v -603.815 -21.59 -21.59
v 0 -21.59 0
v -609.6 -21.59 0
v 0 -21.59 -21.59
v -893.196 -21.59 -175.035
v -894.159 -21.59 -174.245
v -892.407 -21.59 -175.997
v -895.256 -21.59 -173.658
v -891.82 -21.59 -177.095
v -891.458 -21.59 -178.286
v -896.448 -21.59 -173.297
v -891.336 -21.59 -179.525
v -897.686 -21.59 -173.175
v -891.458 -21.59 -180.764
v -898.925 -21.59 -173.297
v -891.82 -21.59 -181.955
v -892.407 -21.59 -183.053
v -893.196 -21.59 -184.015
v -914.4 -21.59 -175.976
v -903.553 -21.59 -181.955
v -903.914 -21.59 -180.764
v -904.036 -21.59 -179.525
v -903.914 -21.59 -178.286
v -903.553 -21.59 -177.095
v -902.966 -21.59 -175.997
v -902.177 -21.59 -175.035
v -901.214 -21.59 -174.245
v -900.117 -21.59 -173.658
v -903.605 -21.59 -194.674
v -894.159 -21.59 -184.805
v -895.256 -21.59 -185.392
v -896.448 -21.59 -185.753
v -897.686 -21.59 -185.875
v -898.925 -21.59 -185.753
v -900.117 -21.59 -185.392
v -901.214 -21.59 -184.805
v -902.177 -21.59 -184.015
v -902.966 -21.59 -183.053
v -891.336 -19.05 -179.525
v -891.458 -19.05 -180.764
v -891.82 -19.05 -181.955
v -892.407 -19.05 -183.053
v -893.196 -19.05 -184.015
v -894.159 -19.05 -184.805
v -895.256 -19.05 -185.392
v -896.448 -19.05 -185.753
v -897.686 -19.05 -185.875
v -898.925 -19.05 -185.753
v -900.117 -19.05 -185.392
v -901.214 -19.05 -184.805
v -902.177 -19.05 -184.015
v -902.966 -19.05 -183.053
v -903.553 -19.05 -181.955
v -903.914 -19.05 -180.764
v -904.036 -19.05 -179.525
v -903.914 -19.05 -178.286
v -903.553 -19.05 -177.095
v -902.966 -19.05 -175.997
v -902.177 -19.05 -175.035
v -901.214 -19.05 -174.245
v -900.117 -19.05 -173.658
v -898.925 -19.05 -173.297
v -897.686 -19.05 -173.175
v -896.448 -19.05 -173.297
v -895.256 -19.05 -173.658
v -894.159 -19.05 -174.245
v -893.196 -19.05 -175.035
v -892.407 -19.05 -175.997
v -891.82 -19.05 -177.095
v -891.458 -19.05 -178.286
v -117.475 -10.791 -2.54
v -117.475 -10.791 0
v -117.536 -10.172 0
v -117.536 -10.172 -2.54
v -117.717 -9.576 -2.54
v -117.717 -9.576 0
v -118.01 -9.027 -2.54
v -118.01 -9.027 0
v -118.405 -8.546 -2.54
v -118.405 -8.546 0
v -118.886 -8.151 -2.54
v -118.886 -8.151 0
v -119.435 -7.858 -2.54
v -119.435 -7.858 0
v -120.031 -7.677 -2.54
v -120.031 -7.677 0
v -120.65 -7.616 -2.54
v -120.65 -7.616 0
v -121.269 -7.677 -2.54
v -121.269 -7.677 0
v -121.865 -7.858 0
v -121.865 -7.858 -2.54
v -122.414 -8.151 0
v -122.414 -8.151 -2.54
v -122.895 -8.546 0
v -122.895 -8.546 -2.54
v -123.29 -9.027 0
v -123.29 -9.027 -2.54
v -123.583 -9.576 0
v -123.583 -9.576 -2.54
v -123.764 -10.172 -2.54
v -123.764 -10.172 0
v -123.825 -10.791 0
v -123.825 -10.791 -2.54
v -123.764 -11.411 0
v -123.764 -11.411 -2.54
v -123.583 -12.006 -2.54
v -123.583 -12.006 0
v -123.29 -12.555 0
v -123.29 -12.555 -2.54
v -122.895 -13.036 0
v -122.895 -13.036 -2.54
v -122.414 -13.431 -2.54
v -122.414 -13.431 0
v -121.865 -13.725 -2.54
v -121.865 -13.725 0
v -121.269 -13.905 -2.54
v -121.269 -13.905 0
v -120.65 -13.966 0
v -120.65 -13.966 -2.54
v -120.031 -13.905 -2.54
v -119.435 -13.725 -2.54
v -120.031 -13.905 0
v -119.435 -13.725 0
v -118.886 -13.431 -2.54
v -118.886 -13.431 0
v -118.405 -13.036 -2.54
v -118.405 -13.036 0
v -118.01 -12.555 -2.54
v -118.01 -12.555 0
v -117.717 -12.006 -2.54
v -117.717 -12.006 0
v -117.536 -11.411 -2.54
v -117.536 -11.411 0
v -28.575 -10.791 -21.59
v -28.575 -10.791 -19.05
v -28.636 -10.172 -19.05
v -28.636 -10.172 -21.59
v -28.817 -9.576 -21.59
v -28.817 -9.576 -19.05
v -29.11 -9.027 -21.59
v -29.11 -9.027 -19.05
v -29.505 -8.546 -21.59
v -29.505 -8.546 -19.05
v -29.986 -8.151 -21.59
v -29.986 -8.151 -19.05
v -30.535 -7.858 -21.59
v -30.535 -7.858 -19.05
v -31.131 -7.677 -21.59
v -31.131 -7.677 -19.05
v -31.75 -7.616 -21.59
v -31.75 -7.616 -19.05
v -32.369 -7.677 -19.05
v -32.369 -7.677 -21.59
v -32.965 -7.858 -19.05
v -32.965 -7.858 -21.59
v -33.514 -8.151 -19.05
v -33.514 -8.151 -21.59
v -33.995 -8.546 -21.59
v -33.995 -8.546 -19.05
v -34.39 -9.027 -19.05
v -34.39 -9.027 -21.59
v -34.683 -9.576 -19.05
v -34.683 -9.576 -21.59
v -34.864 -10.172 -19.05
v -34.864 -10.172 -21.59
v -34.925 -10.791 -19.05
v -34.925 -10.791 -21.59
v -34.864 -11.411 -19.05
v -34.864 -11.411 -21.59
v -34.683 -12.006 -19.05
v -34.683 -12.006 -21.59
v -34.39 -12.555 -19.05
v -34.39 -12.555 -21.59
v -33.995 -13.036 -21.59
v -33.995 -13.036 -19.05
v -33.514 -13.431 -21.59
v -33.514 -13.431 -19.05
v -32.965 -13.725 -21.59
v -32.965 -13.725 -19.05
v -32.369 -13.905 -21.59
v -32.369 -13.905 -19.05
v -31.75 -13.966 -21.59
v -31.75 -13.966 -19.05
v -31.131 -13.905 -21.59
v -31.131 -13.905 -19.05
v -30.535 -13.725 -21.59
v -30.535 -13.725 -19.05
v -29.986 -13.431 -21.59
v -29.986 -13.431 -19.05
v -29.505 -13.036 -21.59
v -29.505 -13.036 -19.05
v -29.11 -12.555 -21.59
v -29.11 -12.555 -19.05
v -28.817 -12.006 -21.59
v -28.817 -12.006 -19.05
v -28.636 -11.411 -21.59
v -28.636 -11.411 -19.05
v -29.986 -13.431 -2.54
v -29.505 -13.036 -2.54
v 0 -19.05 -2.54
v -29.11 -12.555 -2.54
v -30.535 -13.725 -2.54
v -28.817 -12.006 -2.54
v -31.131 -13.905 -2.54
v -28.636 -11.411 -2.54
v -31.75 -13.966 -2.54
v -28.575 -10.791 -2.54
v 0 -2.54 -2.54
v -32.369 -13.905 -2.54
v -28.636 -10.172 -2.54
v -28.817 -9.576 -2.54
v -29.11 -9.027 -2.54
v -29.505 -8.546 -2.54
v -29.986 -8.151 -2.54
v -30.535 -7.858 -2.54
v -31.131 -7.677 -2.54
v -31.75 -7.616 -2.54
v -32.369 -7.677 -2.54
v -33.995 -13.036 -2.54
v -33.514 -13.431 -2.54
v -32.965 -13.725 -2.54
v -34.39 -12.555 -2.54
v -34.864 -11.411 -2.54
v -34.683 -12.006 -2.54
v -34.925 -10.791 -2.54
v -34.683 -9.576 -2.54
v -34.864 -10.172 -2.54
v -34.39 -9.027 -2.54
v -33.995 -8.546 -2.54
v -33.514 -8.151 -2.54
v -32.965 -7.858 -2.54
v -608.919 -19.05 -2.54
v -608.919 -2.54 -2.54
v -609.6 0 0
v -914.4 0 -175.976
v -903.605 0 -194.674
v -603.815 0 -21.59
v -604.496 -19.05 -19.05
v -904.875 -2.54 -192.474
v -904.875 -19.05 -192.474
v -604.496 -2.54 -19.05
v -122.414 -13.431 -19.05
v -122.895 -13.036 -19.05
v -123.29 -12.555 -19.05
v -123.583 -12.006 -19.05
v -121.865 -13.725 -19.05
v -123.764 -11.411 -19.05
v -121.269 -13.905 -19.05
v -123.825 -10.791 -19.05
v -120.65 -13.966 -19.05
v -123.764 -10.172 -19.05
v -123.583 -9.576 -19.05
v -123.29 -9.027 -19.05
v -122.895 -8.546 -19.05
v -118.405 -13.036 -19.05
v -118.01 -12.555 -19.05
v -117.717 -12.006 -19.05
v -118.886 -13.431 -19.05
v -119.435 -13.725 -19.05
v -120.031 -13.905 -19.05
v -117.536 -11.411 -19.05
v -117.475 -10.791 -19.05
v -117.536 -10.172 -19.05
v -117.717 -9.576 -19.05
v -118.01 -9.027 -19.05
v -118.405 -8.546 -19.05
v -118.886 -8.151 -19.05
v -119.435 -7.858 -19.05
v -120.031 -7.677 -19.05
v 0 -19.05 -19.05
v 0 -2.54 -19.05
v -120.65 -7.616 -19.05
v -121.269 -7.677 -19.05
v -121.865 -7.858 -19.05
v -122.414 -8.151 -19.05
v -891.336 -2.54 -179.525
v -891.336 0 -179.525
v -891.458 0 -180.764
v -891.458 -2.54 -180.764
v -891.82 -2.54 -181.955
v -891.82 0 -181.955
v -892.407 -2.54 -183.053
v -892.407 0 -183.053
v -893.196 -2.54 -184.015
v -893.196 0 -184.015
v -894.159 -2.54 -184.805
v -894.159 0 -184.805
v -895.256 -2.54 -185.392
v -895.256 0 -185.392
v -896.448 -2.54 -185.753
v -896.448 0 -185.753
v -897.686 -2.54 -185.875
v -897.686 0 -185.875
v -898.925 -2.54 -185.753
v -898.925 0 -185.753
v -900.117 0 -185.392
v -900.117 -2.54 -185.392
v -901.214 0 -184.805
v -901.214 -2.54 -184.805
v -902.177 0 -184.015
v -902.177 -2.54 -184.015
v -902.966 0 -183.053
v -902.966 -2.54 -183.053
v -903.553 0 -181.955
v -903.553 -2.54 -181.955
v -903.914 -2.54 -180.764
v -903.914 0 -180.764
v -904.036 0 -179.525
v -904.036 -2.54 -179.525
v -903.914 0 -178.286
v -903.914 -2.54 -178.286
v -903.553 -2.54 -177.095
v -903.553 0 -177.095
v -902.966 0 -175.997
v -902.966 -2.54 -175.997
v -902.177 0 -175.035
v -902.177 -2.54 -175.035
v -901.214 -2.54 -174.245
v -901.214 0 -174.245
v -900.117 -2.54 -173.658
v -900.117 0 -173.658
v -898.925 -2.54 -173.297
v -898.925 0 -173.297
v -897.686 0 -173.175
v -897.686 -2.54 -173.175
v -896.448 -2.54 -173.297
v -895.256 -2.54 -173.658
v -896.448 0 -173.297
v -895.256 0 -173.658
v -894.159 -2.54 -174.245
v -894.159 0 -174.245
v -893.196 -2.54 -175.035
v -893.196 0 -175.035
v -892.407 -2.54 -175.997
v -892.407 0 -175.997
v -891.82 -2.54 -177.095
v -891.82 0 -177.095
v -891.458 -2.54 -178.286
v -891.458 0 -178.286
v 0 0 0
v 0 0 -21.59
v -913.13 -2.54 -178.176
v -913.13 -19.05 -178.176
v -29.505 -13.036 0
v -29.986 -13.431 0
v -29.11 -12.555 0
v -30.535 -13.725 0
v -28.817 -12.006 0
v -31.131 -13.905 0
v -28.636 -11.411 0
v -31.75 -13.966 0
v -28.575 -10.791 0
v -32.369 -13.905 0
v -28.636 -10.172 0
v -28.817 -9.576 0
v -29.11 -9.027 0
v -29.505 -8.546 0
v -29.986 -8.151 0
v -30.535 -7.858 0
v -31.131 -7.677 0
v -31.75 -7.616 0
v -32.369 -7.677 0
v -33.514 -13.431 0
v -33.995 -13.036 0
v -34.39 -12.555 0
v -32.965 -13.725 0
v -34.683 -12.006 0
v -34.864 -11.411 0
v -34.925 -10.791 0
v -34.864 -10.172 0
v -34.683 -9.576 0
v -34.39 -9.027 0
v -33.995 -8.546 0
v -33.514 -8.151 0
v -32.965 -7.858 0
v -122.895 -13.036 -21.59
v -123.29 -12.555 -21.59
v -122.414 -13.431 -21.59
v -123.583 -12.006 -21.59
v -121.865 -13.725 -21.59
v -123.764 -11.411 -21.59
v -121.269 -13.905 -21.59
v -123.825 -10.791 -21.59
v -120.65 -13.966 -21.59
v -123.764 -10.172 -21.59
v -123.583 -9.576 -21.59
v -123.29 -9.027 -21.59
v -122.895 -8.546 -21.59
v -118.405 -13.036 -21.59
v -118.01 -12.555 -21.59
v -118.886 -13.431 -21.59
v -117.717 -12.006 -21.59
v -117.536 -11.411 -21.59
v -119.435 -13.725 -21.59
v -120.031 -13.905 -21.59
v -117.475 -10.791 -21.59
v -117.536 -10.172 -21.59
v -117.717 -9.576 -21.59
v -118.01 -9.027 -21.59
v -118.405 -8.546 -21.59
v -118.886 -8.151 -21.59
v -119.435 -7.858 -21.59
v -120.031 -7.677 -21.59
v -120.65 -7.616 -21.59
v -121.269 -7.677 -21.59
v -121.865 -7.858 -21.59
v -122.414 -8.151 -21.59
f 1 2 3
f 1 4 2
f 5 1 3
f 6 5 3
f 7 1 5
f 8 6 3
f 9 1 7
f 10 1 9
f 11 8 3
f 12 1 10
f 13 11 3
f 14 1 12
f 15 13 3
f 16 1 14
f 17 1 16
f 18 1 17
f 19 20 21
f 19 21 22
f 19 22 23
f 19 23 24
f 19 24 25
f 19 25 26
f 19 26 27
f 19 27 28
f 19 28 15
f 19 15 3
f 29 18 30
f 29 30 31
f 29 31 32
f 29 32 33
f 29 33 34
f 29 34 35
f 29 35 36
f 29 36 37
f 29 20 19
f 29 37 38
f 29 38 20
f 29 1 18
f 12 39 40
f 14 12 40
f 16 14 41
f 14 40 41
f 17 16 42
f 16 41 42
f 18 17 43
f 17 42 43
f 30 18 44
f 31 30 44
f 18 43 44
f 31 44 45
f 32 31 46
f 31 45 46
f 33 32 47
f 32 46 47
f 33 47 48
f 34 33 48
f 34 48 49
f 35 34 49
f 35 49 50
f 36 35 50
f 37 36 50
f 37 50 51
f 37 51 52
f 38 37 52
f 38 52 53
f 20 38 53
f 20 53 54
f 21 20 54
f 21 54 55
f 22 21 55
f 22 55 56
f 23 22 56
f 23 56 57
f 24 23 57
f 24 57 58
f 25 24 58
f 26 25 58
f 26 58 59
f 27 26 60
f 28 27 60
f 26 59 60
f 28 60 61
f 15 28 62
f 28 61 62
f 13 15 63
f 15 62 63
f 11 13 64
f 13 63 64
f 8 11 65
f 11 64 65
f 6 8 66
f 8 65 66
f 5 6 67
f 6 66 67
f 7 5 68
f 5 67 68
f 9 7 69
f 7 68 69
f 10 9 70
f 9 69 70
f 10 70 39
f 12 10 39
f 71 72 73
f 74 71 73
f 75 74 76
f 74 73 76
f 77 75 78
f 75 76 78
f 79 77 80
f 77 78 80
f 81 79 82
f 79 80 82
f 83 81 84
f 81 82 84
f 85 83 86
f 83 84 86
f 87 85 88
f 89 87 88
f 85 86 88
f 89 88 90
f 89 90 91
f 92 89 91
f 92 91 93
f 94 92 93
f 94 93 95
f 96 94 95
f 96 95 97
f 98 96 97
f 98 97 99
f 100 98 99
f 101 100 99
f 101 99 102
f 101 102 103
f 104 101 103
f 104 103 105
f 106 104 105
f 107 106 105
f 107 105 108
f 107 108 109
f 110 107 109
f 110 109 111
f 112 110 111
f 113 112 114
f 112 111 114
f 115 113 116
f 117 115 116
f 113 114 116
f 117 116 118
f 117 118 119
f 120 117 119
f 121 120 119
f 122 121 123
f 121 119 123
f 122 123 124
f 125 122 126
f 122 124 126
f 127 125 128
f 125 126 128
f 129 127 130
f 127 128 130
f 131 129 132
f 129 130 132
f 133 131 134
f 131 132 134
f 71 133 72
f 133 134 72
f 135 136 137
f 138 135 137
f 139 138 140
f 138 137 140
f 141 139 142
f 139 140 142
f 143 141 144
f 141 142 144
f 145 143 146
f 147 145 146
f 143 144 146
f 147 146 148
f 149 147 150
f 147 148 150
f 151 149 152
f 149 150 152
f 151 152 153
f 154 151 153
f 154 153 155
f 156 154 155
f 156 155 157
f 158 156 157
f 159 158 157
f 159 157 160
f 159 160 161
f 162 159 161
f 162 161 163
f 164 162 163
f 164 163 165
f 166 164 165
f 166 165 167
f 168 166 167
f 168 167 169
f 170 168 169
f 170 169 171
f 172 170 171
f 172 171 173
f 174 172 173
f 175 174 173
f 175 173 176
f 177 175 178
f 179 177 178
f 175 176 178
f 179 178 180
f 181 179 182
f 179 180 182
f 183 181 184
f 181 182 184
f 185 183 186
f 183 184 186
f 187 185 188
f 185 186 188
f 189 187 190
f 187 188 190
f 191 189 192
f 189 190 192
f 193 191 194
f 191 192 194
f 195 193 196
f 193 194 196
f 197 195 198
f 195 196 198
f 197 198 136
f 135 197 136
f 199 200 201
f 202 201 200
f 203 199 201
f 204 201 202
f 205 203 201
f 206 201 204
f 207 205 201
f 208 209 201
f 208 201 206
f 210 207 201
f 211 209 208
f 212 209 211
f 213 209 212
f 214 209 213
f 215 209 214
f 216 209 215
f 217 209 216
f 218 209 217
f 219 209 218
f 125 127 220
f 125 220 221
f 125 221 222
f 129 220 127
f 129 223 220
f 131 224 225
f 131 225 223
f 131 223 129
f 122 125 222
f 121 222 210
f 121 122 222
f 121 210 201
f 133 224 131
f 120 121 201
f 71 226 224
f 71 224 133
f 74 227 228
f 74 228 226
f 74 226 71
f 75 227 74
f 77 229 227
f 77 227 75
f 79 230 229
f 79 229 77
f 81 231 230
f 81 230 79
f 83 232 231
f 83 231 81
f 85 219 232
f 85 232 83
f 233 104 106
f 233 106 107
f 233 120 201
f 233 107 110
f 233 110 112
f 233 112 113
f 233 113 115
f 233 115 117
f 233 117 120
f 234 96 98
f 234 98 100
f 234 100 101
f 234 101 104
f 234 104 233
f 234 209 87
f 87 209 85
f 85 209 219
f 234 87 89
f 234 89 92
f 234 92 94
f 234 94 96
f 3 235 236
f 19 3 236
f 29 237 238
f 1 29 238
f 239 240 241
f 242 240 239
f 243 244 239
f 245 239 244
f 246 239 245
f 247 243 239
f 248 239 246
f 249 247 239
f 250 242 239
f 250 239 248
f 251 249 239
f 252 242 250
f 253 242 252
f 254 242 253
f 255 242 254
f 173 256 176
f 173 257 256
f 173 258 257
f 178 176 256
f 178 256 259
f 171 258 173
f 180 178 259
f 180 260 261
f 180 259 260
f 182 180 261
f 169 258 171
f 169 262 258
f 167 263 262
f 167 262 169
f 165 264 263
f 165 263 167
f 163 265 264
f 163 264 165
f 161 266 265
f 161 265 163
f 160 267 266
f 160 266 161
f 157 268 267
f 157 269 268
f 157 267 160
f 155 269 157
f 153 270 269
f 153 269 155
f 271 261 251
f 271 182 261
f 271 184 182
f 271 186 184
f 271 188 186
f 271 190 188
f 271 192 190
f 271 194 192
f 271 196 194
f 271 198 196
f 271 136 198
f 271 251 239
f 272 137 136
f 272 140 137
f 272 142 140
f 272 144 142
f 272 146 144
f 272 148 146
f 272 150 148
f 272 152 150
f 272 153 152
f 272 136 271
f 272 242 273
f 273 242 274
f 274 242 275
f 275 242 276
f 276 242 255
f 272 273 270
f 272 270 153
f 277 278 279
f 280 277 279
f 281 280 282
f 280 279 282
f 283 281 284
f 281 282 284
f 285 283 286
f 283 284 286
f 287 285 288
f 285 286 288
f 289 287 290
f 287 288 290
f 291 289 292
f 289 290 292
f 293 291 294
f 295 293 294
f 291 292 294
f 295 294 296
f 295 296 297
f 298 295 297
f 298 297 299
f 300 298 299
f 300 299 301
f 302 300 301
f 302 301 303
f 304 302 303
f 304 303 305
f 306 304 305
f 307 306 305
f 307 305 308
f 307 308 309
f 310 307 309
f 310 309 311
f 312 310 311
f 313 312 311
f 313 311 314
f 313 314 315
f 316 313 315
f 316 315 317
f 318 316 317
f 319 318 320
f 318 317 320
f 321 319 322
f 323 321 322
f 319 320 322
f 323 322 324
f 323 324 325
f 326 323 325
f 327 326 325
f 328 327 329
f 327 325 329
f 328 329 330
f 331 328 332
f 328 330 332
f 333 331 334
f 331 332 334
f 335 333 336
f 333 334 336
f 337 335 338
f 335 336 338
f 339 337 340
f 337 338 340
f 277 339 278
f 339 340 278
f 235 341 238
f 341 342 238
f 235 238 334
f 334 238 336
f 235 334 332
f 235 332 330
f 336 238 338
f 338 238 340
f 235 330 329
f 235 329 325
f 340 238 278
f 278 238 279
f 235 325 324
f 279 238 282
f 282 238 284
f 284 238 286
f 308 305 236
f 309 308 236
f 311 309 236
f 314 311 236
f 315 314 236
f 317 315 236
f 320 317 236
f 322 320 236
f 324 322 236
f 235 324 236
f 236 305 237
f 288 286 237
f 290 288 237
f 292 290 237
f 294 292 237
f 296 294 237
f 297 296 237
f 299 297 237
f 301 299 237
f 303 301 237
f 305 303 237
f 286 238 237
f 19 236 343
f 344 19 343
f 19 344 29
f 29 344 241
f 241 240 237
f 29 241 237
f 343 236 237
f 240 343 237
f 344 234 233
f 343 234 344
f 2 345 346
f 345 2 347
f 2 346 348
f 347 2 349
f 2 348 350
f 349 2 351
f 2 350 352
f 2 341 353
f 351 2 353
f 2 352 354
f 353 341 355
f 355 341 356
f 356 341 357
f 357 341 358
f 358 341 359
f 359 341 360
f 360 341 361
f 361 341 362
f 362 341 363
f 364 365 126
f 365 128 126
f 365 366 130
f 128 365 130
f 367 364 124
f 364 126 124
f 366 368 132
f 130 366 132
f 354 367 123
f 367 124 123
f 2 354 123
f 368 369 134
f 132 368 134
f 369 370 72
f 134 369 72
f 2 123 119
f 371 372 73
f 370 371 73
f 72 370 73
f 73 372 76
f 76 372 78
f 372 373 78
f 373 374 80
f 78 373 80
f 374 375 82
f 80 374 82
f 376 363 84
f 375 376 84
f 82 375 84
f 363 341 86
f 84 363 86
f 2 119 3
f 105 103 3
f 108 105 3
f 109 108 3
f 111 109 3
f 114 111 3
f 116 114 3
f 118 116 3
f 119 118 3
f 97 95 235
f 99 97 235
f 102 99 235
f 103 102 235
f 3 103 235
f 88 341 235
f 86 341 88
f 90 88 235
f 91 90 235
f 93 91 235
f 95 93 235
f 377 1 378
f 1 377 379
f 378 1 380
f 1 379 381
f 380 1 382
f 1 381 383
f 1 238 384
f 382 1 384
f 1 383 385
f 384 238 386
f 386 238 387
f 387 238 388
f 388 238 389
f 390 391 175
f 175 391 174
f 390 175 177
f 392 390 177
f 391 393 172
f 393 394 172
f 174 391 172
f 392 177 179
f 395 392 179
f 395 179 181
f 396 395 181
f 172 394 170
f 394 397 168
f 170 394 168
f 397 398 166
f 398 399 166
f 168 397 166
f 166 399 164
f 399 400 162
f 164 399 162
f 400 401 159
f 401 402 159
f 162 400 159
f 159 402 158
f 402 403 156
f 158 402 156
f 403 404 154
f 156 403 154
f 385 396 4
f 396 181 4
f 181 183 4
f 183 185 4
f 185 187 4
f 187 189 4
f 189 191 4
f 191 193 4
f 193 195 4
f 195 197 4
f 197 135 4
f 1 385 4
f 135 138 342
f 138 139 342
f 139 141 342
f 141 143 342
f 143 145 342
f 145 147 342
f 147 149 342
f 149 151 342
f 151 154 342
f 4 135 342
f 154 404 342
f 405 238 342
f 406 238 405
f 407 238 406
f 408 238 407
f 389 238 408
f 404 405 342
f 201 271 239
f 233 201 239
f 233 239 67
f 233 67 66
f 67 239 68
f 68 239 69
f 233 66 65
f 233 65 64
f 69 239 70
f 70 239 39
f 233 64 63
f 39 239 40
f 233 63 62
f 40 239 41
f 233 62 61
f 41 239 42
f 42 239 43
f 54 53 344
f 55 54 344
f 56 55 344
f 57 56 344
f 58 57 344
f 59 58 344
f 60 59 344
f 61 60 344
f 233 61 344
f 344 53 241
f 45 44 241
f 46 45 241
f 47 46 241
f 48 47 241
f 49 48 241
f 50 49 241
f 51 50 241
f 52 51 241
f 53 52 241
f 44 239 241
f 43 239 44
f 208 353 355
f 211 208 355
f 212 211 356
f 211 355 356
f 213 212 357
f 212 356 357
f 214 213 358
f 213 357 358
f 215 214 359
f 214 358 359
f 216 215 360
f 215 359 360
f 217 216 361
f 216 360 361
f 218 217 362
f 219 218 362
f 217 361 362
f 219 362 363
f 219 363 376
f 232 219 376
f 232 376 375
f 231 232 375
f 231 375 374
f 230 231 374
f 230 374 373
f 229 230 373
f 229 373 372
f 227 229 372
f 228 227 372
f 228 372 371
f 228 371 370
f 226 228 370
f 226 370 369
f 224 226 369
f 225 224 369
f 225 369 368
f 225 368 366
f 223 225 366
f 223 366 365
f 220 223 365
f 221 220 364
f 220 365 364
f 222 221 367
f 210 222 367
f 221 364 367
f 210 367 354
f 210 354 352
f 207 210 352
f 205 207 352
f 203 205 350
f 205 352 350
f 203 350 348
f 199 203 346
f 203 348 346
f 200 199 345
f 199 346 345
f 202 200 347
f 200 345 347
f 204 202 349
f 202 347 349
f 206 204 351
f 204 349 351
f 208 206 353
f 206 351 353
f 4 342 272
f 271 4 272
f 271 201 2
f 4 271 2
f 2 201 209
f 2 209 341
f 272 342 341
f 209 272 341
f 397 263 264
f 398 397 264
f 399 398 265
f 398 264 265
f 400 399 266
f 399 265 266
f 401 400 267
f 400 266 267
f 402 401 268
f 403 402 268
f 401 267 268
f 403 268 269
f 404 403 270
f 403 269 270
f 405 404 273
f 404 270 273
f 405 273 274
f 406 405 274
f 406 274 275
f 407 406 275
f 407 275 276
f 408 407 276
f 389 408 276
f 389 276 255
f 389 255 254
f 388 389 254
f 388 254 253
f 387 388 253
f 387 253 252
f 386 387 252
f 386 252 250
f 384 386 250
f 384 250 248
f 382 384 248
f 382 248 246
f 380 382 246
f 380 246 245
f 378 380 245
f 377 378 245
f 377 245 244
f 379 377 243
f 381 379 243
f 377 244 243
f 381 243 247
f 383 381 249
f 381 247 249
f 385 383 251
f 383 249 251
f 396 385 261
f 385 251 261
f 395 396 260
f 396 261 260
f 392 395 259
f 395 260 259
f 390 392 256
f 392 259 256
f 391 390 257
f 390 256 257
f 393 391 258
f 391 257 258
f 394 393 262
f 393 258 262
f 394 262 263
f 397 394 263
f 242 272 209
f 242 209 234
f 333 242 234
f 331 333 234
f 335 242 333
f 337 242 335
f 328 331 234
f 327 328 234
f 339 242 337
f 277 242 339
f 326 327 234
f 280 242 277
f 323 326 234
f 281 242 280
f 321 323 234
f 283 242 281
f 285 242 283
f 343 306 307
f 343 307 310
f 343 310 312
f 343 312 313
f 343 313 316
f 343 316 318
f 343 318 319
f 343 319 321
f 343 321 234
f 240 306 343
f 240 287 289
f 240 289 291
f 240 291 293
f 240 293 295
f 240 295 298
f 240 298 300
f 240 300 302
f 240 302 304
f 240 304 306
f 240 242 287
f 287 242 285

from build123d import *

# Parameters (mm, degrees)
BOSS_EXTRUDE1_DEPTH          = 21.59
SHELL3_T                     = -2.54
SKETCH2_R                    = 3.175
PIN_HOLES_DEPTH              = 195.673850517
SKETCH3_R                    = 6.35
TOW_HITCH_ADAPTOR_HOLE_DEPTH = 22.59


with BuildPart() as part:
    # Sketch1 → Boss-Extrude1 (new body)
    with BuildSketch(Plane(origin=(0, 0, 0), x_dir=(1, 0, 0), z_dir=(0, 1, 0))):
        Polygon((0, 0), (-609.6, 0), (-914.4, 175.976362049), (-903.605, 194.673850517), (-603.814976935, 21.59), (0, 21.59), align=None)
    extrude(amount=-BOSS_EXTRUDE1_DEPTH)

    # Shell3
    shell3_openings = [part.faces().sort_by_distance(p)[0] for p in [
        (-909.0025, -10.795, -185.325106283),
        (0, -10.795, -10.795),
    ]]
    offset(amount=SHELL3_T, openings=shell3_openings, kind=Kind.INTERSECTION)

    # Sketch2 → PIN HOLES (cut, through all)
    with BuildSketch(Plane.XY):
        with Locations((-120.65, -10.791269693)):
            Circle(SKETCH2_R)
        with Locations((-31.75, -10.791269693)):
            Circle(SKETCH2_R)
    extrude(amount=-PIN_HOLES_DEPTH, mode=Mode.SUBTRACT)

    # Sketch3 → TOW HITCH ADAPTOR HOLE (cut, through all)
    with BuildSketch(Plane(origin=(0, 0, 0), x_dir=(1, 0, 0), z_dir=(0, 1, 0))):
        with Locations((-897.686477372, 179.525032414)):
            Circle(SKETCH3_R)
    extrude(amount=-TOW_HITCH_ADAPTOR_HOLE_DEPTH, mode=Mode.SUBTRACT)


solid = part.part
